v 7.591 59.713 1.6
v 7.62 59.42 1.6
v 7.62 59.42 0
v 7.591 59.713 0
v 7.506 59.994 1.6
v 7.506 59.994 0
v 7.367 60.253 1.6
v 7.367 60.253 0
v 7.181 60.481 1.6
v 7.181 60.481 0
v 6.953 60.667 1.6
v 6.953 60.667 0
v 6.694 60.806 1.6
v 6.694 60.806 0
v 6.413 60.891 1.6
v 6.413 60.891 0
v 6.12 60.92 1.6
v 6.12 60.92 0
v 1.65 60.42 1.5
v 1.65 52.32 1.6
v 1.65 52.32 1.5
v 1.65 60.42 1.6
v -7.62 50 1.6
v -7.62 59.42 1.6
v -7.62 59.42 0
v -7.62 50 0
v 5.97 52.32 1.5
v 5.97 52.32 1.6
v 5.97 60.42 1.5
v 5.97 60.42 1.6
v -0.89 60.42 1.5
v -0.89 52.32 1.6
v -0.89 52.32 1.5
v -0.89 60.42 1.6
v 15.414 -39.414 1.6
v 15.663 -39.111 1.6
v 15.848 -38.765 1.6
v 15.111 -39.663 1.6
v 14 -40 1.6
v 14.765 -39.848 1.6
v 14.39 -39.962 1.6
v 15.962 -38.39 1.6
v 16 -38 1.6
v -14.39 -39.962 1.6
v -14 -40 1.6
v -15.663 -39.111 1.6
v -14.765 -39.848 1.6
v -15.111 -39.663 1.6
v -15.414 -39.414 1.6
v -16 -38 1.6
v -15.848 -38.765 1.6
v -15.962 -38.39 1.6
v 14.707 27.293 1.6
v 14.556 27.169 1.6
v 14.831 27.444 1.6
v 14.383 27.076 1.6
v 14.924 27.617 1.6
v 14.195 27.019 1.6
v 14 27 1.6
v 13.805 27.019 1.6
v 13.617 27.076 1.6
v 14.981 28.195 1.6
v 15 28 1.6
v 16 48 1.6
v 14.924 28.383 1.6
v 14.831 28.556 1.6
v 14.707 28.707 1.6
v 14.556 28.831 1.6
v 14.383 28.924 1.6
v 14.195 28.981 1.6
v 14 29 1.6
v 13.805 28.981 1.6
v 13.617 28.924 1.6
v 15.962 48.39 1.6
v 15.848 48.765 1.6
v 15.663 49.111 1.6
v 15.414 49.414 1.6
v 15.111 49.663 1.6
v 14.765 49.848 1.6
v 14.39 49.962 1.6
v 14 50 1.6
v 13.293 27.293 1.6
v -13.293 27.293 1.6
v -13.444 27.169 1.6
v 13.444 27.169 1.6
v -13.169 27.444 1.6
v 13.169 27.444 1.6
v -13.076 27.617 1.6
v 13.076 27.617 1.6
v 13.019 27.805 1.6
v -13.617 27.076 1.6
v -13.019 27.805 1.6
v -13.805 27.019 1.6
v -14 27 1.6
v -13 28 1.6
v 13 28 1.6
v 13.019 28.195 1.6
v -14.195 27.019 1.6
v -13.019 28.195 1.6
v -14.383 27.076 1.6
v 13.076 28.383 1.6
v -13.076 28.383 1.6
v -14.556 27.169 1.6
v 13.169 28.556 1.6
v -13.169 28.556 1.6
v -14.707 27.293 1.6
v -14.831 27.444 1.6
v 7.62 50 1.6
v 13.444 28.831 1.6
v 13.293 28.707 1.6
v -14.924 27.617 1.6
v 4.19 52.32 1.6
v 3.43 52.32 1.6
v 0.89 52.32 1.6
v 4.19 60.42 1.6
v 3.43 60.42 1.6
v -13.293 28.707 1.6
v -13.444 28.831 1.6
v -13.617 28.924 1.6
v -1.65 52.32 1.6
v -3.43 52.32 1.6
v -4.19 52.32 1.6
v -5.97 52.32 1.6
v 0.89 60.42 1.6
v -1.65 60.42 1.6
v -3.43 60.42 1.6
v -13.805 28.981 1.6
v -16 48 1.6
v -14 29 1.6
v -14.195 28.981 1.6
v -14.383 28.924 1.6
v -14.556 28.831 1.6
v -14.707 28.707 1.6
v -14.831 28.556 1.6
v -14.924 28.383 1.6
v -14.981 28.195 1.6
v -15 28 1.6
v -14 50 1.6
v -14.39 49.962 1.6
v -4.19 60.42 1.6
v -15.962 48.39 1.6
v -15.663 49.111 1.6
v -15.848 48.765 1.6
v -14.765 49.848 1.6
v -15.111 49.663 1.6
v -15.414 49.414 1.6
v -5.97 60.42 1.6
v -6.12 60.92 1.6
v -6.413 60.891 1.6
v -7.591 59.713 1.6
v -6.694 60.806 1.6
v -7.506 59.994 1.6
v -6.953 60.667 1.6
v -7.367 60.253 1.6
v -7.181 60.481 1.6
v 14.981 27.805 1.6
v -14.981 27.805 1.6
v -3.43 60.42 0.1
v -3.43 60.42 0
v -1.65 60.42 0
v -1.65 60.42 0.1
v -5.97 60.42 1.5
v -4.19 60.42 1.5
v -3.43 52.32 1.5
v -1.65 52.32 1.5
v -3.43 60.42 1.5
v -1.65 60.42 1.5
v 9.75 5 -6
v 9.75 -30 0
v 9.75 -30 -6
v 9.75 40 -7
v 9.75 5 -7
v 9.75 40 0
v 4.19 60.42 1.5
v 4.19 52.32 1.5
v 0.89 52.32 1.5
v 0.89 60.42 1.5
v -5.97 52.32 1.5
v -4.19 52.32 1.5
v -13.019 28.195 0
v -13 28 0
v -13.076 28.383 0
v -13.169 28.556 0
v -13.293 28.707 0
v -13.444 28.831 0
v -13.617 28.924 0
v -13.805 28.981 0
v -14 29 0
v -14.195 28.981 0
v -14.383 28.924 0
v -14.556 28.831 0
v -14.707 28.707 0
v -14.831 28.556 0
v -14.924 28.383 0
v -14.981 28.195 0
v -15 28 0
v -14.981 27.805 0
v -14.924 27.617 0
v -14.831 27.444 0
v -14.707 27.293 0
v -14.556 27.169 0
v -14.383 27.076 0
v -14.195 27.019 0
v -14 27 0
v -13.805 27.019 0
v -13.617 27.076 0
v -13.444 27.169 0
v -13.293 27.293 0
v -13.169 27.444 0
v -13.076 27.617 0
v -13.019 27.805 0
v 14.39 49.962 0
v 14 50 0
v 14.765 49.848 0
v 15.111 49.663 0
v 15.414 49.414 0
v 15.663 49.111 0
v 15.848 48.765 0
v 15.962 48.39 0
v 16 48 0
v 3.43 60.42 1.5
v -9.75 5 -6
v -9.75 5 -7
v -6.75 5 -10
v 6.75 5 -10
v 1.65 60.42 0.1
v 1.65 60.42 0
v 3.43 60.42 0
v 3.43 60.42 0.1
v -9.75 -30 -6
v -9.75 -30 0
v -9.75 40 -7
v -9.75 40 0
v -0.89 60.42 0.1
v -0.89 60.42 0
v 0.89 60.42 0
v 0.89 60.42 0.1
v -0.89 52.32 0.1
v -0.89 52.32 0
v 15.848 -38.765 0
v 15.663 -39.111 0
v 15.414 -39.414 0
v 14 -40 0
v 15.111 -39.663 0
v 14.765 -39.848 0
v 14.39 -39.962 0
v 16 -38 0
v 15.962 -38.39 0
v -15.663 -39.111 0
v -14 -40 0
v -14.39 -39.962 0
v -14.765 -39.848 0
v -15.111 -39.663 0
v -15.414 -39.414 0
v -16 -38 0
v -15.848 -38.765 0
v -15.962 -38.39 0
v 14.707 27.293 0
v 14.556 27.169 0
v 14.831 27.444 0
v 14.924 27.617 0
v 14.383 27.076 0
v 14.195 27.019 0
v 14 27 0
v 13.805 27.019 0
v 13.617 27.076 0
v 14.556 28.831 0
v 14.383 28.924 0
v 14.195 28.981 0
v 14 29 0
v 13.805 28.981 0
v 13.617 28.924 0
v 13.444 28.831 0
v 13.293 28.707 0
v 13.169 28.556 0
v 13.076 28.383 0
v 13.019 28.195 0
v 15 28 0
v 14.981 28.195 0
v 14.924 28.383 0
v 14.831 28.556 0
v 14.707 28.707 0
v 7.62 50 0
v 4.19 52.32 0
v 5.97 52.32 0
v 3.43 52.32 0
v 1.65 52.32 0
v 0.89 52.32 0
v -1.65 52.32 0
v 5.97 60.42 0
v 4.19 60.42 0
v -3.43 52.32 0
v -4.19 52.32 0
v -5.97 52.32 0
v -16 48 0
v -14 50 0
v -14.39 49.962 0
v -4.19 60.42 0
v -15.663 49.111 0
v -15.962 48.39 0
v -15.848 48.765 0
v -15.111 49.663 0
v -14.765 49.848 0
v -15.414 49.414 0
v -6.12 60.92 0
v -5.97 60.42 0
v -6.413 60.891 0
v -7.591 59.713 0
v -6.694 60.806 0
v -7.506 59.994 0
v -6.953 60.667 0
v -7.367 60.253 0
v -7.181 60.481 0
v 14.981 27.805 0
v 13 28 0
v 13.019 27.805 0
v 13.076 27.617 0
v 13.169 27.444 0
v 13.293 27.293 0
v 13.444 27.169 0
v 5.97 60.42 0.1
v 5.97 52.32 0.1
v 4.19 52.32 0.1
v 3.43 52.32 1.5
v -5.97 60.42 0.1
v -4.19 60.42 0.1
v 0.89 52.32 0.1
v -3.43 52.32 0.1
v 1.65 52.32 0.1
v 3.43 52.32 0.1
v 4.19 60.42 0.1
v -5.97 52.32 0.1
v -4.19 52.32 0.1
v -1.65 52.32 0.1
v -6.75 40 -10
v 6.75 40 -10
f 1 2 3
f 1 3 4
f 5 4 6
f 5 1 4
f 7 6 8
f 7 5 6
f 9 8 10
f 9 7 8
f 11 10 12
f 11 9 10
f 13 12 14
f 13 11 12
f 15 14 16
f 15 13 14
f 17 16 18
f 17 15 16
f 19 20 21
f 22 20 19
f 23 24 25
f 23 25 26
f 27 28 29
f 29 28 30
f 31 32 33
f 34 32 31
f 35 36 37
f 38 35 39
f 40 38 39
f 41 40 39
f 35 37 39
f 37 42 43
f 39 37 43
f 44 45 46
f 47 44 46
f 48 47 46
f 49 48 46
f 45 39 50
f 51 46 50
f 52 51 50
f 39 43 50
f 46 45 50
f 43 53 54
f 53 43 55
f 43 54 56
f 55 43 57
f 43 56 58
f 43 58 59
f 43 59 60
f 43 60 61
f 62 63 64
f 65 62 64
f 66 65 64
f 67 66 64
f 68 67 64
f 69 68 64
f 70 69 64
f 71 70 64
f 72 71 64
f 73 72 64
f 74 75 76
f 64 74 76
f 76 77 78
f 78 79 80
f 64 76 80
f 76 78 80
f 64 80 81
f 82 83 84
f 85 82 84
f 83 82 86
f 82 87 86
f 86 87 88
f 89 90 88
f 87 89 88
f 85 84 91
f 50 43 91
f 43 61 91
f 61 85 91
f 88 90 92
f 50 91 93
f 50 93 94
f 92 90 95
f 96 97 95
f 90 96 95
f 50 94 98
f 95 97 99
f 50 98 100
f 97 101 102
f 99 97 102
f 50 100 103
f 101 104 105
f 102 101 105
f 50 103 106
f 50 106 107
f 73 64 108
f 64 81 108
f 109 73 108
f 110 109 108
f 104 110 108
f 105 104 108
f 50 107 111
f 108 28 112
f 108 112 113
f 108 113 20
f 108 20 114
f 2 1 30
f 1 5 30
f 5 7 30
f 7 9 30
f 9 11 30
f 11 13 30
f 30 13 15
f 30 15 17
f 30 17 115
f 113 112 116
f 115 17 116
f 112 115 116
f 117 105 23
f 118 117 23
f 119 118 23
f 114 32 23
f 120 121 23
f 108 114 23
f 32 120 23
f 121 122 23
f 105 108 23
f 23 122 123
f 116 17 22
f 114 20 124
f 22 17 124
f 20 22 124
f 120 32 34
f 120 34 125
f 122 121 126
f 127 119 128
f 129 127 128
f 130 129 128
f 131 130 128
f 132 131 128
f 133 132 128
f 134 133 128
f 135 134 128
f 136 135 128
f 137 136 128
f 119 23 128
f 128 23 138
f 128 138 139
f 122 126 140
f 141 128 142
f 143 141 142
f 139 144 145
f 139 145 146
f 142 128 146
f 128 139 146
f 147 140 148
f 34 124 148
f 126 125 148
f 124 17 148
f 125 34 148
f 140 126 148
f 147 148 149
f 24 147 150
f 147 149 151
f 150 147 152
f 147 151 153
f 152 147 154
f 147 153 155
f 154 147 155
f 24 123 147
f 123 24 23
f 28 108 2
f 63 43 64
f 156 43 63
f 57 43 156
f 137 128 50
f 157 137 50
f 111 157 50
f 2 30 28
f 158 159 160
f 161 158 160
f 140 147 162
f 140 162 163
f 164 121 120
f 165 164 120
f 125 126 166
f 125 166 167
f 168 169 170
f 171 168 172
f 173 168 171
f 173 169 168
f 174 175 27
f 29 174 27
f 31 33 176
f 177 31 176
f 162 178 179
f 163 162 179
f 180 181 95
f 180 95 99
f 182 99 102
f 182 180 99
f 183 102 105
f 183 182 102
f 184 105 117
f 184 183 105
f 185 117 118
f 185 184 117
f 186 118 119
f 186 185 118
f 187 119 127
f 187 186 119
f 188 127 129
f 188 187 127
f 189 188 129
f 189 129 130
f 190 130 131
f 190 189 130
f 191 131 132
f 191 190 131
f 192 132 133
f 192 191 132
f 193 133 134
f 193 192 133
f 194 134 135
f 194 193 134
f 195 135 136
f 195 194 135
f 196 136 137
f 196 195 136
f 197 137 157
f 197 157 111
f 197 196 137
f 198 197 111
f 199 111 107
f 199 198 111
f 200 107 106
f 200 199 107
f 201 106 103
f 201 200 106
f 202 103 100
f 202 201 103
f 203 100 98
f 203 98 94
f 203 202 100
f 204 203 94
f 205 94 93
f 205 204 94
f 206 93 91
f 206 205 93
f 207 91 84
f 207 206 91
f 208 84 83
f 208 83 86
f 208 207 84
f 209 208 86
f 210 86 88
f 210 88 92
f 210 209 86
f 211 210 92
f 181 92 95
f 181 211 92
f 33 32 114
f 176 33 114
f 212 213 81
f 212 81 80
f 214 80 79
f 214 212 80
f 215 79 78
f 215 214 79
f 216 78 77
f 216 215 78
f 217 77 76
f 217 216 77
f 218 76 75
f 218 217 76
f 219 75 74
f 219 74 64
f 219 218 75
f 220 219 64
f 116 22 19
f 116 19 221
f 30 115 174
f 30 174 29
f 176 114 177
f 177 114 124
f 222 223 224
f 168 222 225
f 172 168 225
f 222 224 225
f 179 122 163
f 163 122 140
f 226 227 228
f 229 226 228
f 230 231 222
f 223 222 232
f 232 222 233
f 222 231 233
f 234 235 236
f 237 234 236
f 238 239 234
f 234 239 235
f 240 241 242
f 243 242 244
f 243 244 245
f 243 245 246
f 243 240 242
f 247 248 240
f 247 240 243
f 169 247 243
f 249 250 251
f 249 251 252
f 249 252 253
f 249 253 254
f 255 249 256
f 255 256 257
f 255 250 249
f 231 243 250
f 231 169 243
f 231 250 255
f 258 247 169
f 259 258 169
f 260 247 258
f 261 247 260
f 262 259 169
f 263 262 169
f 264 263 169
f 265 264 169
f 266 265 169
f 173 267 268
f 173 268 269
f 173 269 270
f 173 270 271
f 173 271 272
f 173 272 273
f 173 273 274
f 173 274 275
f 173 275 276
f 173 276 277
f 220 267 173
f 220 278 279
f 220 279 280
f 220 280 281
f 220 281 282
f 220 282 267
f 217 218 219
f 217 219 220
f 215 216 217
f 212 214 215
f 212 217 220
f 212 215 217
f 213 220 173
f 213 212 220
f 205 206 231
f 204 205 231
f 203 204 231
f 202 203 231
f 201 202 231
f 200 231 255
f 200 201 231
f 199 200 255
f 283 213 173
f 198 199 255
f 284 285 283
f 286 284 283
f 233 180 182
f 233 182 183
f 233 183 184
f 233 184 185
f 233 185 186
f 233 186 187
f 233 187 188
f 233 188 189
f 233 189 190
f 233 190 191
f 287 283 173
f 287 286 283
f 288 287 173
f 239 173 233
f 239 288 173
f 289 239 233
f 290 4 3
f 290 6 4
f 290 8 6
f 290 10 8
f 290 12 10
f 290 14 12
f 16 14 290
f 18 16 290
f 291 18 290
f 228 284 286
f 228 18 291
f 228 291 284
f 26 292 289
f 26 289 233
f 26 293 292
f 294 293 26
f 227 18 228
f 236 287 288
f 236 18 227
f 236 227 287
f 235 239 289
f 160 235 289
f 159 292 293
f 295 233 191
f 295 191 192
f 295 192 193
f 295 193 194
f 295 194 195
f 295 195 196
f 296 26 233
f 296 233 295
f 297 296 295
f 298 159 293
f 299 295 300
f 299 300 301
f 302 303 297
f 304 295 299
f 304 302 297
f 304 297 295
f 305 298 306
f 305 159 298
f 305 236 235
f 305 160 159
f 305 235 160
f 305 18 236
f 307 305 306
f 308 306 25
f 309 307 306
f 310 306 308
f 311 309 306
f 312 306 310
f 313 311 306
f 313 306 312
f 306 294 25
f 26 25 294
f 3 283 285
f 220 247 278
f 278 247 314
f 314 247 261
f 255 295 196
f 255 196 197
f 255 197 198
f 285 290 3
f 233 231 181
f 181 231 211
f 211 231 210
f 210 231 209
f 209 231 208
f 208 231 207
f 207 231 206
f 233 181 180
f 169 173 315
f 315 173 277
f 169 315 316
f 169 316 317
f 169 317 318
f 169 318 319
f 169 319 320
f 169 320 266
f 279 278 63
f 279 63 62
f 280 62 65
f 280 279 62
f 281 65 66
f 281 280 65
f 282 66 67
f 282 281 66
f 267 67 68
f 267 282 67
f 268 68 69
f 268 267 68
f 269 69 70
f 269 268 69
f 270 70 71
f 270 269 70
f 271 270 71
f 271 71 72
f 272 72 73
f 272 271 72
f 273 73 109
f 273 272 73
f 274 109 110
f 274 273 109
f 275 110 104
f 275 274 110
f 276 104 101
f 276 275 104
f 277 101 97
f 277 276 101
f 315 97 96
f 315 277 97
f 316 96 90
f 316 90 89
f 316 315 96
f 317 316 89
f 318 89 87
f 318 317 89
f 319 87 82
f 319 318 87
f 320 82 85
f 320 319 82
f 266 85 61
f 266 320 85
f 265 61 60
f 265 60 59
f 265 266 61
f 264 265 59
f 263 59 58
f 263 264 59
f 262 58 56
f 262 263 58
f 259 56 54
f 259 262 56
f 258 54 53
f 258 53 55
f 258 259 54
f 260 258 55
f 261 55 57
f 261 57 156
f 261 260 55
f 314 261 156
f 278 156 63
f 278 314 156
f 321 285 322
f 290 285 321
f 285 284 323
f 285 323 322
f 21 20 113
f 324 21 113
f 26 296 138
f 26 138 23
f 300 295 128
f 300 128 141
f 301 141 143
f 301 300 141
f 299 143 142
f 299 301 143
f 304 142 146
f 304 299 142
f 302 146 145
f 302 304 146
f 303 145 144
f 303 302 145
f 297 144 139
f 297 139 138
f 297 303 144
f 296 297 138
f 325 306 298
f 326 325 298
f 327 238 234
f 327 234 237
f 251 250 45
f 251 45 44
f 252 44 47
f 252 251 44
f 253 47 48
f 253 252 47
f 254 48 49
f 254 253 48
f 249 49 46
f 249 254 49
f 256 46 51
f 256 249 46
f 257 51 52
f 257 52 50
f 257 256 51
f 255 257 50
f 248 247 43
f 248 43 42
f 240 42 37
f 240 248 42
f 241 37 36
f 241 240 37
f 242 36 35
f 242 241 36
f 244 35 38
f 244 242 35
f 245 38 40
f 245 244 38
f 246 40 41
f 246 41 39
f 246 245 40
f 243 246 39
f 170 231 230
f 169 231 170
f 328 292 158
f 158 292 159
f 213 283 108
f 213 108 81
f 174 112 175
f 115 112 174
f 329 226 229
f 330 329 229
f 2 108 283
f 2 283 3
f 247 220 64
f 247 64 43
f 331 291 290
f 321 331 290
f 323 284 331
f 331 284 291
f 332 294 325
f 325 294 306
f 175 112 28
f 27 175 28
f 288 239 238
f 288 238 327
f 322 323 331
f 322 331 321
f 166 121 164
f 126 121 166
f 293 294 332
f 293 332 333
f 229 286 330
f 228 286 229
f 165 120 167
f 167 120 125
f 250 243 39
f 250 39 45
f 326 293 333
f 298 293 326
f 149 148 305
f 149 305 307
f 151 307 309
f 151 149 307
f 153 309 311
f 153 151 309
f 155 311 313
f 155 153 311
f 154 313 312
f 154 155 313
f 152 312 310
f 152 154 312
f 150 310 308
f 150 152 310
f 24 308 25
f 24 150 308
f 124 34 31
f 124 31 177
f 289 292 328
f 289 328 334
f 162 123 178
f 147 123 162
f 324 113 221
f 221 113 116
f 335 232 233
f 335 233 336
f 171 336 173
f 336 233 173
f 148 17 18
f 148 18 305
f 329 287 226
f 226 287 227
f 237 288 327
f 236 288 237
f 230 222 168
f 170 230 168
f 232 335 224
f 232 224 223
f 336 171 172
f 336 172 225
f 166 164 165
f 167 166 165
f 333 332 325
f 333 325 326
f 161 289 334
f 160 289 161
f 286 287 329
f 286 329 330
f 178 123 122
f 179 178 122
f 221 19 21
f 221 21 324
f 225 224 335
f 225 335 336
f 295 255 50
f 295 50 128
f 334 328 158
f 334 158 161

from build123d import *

# Parameters (mm, degrees)
SKETCH_1_R          = 1
EXTRUDE_1_DEPTH     = 1.6
SKETCH_2_R          = 1
CUT_EXTRUDE_1_DEPTH = 1.6
EXTRUDE_START       = 1.6
EXTRUDE_2_DEPTH     = 1.6
SKETCH_4_W          = 1.78
SKETCH_4_H          = 8.1
CUT_EXTRUDE_2_DEPTH = 0.1
CUT_EXTRUDE_START   = 1.6
SKETCH_5_W          = 1.78
SKETCH_5_H          = 8.1
CUT_EXTRUDE_3_DEPTH = 0.1
SKETCH_6_W          = 19.5
SKETCH_6_H          = 70
EXTRUDE_3_DEPTH     = 10
CUT_EXTRUDE_START_2 = 40
CUT_EXTRUDE_4_DEPTH = 70
CUT_EXTRUDE_START_3 = -10
SKETCH_9_W          = 19.5
SKETCH_9_H          = 35
CUT_EXTRUDE_5_DEPTH = 4
CUT_EXTRUDE_6_DEPTH = 1.6


with BuildPart() as part:
    # 草图1 → 凸台-拉伸1 (new body)
    with BuildSketch(Plane.XY):
        with BuildLine():
            Line((-14, 50), (14, 50))
            ThreePointArc((14, 50), (15.414213562, 49.414213562), (16, 48))
            Line((16, 48), (16, -48))
            ThreePointArc((16, -48), (15.414213562, -49.414213562), (14, -50))
            Line((14, -50), (-14, -50))
            ThreePointArc((-14, -50), (-15.414213562, -49.414213562), (-16, -48))
            Line((-16, -48), (-16, 48))
            ThreePointArc((-16, 48), (-15.414213562, 49.414213562), (-14, 50))
        make_face()
        with Locations((-14, -48)):
            Circle(SKETCH_1_R, mode=Mode.SUBTRACT)
        with Locations((14, -48)):
            Circle(SKETCH_1_R, mode=Mode.SUBTRACT)
    extrude(amount=EXTRUDE_1_DEPTH)

    # 草图2 → 切除-拉伸1 (cut)
    with BuildSketch(Plane.XY):
        with Locations((-14, 28)):
            Circle(SKETCH_2_R)
        with Locations((14, 28)):
            Circle(SKETCH_2_R)
    extrude(amount=CUT_EXTRUDE_1_DEPTH, mode=Mode.SUBTRACT)

    # 草图3 → 凸台-拉伸2 (add)
    with BuildSketch(Plane.XY.offset(EXTRUDE_START)):
        with BuildLine():
            Line((-7.62, 50), (7.62, 50))
            Line((7.62, 50), (7.62, 59.42))
            ThreePointArc((7.62, 59.42), (7.180660172, 60.480660172), (6.12, 60.92))
            Line((6.12, 60.92), (-6.12, 60.92))
            ThreePointArc((-6.12, 60.92), (-7.180660172, 60.480660172), (-7.62, 59.42))
            Line((-7.62, 59.42), (-7.62, 50))
        make_face()
        with BuildLine():
            Line((-7.62, -59.42), (-7.62, -50))
            Line((-7.62, -50), (7.62, -50))
            Line((7.62, -50), (7.62, -59.42))
            ThreePointArc((7.62, -59.42), (7.180660172, -60.480660172), (6.12, -60.92))
            Line((6.12, -60.92), (-6.12, -60.92))
            ThreePointArc((-6.12, -60.92), (-7.180660172, -60.480660172), (-7.62, -59.42))
        make_face()
    extrude(amount=-EXTRUDE_2_DEPTH)

    # 草图4 → 切除-拉伸2 (cut)
    with BuildSketch(Plane.XY):
        with Locations((0, 56.37)):
            Rectangle(SKETCH_4_W, SKETCH_4_H)
        with Locations((2.54, 56.37)):
            Rectangle(SKETCH_4_W, SKETCH_4_H)
        with Locations((5.08, 56.37)):
            Rectangle(SKETCH_4_W, SKETCH_4_H)
        with Locations((-2.54, 56.37)):
            Rectangle(SKETCH_4_W, SKETCH_4_H)
        with Locations((-5.08, 56.37)):
            Rectangle(SKETCH_4_W, SKETCH_4_H)
        with Locations((-5.08, -56.37)):
            Rectangle(SKETCH_4_W, SKETCH_4_H)
        with Locations((-2.54, -56.37)):
            Rectangle(SKETCH_4_W, SKETCH_4_H)
        with Locations((5.08, -56.37)):
            Rectangle(SKETCH_4_W, SKETCH_4_H)
        with Locations((2.54, -56.37)):
            Rectangle(SKETCH_4_W, SKETCH_4_H)
        with Locations((0, -56.37)):
            Rectangle(SKETCH_4_W, SKETCH_4_H)
    extrude(amount=CUT_EXTRUDE_2_DEPTH, mode=Mode.SUBTRACT)

    # 草图5 → 切除-拉伸3 (cut)
    with BuildSketch(Plane.XY.offset(CUT_EXTRUDE_START)):
        with Locations((2.54, 56.37)):
            Rectangle(SKETCH_5_W, SKETCH_5_H)
        with Locations((0, 56.37)):
            Rectangle(SKETCH_5_W, SKETCH_5_H)
        with Locations((-5.08, 56.37)):
            Rectangle(SKETCH_5_W, SKETCH_5_H)
        with Locations((-2.54, 56.37)):
            Rectangle(SKETCH_5_W, SKETCH_5_H)
        with Locations((5.08, 56.37)):
            Rectangle(SKETCH_5_W, SKETCH_5_H)
        with Locations((2.54, -56.37)):
            Rectangle(SKETCH_5_W, SKETCH_5_H)
        with Locations((5.08, -56.37)):
            Rectangle(SKETCH_5_W, SKETCH_5_H)
        with Locations((-2.54, -56.37)):
            Rectangle(SKETCH_5_W, SKETCH_5_H)
        with Locations((-5.08, -56.37)):
            Rectangle(SKETCH_5_W, SKETCH_5_H)
        with Locations((0, -56.37)):
            Rectangle(SKETCH_5_W, SKETCH_5_H)
    extrude(amount=-CUT_EXTRUDE_3_DEPTH, mode=Mode.SUBTRACT)

    # 草图6 → 凸台-拉伸3 (add)
    with BuildSketch(Plane.XY):
        with Locations((0, 5)):
            Rectangle(SKETCH_6_W, SKETCH_6_H)
    extrude(amount=-EXTRUDE_3_DEPTH)

    # 草图7 → 切除-拉伸4 (cut)
    with BuildSketch(Plane(origin=(0, 0, 0), x_dir=(1, 0, 0), z_dir=(0, 1, 0)).offset(CUT_EXTRUDE_START_2)):
        Polygon((9.75, 10), (9.75, 7), (6.75, 10), align=None)
        Polygon((-9.75, 10), (-6.75, 10), (-9.75, 7), align=None)
    extrude(amount=-CUT_EXTRUDE_4_DEPTH, mode=Mode.SUBTRACT)

    # 草图9 → 切除-拉伸5 (cut)
    with BuildSketch(Plane.XY.offset(CUT_EXTRUDE_START_3)):
        with Locations((0, -12.5)):
            Rectangle(SKETCH_9_W, SKETCH_9_H)
    extrude(amount=CUT_EXTRUDE_5_DEPTH, mode=Mode.SUBTRACT)

    # 草图11 → 切除-拉伸6 (cut)
    with BuildSketch(Plane.XY):
        with BuildLine():
            Line((7.62, -50), (14, -50))
            ThreePointArc((14, -50), (15.414213562, -49.414213562), (16, -48))
            Line((16, -48), (16, -38))
            ThreePointArc((16, -38), (15.414213562, -39.414213562), (14, -40))
            Line((14, -40), (-14, -40))
            ThreePointArc((-14, -40), (-15.414213562, -39.414213562), (-16, -38))
            Line((-16, -38), (-16, -48))
            ThreePointArc((-16, -48), (-15.414213562, -49.414213562), (-14, -50))
            Line((-14, -50), (-7.62, -50))
            Line((-7.62, -50), (-7.62, -59.42))
            ThreePointArc((-7.62, -59.42), (-7.180660172, -60.480660172), (-6.12, -60.92))
            Line((-6.12, -60.92), (6.12, -60.92))
            ThreePointArc((6.12, -60.92), (7.180660172, -60.480660172), (7.62, -59.42))
            Line((7.62, -59.42), (7.62, -50))
        make_face()
    extrude(amount=CUT_EXTRUDE_6_DEPTH, mode=Mode.SUBTRACT)


solid = part.part
